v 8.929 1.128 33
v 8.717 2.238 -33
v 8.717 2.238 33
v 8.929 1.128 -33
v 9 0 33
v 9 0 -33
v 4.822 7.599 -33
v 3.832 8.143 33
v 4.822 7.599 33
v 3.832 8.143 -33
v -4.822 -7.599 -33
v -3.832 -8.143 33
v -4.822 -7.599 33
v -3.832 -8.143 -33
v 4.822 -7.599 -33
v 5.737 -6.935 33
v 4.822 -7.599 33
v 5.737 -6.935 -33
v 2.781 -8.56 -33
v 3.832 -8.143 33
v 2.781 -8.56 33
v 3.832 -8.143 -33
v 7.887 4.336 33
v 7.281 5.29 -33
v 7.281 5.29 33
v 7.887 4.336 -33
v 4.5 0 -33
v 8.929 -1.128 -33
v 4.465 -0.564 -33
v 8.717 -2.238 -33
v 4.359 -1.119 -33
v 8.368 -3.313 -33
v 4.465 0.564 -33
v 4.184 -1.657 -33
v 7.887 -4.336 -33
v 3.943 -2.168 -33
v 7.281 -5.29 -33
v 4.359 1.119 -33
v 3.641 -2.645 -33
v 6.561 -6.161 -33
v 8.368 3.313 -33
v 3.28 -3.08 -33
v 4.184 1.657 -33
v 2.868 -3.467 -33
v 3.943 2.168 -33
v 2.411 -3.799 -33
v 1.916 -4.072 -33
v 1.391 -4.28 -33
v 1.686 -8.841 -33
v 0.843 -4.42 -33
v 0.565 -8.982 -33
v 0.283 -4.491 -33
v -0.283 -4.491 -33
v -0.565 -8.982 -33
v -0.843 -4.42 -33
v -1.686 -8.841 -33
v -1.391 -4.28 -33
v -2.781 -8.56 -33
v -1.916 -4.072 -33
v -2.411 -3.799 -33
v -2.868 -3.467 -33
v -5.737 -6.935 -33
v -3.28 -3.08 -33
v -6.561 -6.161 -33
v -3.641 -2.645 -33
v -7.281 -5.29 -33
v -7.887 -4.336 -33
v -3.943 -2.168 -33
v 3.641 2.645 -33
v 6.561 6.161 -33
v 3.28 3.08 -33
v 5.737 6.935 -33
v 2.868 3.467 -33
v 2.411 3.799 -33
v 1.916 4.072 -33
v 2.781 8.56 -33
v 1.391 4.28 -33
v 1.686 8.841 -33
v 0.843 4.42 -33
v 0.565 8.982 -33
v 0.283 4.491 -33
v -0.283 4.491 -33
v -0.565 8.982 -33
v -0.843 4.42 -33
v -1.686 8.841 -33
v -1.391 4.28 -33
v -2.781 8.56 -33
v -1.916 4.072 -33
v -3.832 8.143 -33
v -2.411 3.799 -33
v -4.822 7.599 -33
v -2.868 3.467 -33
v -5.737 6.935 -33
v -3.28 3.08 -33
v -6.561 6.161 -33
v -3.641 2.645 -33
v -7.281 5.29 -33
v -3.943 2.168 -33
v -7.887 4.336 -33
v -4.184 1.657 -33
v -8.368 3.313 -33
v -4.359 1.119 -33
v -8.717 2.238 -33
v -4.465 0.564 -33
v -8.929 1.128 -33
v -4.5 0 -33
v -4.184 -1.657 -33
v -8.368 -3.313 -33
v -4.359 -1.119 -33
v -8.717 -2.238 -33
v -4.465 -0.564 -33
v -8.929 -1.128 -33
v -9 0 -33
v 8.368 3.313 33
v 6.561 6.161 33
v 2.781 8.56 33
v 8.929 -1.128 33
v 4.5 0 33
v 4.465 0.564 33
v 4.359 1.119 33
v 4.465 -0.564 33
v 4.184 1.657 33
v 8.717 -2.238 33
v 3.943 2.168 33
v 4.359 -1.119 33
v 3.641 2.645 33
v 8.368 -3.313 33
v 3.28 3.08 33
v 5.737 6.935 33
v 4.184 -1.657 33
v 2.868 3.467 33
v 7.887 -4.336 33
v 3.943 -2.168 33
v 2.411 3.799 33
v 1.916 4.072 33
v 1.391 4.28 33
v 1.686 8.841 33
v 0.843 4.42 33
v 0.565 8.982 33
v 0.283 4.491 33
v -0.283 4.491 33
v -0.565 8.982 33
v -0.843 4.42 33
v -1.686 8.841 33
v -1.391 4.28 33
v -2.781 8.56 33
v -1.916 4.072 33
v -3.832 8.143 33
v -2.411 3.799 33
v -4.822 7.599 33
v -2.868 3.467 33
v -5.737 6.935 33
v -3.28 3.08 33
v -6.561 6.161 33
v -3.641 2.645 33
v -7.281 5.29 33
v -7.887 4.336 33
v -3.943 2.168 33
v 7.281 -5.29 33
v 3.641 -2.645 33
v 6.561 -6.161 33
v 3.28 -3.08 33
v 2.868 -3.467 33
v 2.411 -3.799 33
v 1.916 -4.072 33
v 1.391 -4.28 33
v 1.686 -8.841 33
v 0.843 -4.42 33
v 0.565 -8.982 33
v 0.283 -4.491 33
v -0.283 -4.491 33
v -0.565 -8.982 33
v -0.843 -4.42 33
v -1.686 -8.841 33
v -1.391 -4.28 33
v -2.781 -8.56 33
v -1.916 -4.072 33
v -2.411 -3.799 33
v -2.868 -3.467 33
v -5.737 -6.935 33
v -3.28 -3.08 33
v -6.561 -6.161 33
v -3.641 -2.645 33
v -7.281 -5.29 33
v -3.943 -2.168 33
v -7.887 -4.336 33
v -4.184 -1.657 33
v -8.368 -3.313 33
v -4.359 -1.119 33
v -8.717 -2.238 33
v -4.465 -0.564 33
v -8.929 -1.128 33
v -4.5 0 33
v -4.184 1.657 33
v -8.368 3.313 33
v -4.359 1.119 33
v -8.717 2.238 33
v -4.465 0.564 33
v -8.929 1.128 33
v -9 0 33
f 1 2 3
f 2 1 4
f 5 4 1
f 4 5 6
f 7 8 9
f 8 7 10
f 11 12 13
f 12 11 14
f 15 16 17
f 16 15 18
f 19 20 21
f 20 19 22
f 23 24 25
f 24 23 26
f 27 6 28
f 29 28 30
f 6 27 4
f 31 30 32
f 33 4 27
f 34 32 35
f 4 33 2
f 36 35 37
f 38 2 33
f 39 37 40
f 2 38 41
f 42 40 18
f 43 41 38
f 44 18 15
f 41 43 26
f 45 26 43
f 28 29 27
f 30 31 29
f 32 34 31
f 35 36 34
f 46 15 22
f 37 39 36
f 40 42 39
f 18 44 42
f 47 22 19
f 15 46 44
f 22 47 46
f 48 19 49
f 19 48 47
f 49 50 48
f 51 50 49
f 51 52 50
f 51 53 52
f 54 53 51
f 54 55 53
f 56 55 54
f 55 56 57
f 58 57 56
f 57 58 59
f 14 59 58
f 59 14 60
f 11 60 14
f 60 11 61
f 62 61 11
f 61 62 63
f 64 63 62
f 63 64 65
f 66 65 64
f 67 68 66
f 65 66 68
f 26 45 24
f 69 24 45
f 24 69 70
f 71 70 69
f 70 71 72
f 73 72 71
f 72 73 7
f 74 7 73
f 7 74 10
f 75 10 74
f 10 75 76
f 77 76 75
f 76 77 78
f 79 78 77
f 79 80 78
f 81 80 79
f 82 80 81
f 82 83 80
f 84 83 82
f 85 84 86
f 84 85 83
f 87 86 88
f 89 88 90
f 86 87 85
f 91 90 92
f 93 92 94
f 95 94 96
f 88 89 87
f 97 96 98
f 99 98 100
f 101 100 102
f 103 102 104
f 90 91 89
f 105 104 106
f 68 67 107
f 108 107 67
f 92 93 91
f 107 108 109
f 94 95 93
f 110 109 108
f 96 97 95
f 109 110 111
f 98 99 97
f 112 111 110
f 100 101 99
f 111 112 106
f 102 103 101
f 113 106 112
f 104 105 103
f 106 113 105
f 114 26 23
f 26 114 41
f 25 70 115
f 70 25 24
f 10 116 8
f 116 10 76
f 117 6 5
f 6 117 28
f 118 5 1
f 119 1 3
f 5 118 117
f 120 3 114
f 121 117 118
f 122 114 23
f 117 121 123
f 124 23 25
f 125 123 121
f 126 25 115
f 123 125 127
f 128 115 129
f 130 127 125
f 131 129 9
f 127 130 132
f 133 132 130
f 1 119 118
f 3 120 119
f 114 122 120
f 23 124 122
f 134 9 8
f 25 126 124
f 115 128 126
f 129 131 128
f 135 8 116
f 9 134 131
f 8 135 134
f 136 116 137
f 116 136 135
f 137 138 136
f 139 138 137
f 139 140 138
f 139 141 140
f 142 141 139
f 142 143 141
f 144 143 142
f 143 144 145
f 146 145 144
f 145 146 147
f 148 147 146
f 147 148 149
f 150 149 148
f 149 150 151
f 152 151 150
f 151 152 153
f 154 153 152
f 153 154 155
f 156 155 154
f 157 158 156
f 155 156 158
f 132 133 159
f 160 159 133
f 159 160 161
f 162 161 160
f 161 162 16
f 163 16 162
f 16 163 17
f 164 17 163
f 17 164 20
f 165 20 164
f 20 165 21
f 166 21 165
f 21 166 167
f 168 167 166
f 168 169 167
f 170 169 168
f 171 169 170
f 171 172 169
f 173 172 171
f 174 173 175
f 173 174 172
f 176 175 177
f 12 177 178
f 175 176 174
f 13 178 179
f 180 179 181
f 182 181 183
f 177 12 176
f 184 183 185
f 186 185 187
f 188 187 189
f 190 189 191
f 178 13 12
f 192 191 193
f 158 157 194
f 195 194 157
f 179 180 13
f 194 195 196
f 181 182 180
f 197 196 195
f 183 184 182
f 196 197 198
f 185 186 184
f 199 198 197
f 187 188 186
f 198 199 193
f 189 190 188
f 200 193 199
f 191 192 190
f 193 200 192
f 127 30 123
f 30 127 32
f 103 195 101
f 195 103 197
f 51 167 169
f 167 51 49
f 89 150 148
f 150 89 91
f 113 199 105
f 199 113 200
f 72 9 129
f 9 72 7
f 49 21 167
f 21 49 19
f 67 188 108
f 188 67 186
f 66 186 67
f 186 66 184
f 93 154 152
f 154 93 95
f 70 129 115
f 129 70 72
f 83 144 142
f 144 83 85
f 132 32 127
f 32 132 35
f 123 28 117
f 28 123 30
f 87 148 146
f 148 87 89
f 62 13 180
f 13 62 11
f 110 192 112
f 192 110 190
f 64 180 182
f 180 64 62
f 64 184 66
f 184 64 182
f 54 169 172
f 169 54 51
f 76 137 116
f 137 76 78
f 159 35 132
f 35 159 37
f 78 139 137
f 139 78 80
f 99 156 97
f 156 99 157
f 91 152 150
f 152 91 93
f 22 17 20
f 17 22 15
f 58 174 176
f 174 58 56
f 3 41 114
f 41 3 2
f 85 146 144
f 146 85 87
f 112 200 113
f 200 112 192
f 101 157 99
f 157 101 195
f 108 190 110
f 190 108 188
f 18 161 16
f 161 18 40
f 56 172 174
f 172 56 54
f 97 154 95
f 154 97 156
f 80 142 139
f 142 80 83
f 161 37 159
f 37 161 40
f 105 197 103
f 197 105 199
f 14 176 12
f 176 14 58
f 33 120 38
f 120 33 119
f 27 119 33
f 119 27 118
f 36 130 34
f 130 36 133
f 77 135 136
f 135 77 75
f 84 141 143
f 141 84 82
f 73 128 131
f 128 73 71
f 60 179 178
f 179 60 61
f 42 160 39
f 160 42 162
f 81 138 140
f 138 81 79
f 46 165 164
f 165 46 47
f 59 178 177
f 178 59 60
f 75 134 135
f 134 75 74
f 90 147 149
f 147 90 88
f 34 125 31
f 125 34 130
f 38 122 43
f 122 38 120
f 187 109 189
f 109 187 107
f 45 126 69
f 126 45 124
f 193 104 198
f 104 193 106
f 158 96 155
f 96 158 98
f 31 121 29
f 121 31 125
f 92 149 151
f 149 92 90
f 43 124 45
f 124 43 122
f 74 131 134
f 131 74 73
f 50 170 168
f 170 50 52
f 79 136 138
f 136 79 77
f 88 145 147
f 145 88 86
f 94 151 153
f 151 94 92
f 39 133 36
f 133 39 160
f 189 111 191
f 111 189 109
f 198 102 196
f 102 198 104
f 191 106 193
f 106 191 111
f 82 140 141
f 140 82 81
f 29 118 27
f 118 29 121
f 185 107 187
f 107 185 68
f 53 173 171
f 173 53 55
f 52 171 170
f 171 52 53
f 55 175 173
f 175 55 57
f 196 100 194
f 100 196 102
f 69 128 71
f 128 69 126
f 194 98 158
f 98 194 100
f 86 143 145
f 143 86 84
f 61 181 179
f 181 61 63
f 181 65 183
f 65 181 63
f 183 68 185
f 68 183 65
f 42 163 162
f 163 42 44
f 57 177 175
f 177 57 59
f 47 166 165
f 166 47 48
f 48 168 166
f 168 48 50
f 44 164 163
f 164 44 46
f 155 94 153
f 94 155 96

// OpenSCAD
$fn = 50;


difference() {
	union() {
		translate(v = [0, 0, -33.0000000000]) {
			cylinder(h = 66, r = 9.0000000000);
		}
	}
	union() {
		translate(v = [0, 0, -100.0000000000]) {
			cylinder(h = 200, r = 4.5000000000);
		}
	}
}
